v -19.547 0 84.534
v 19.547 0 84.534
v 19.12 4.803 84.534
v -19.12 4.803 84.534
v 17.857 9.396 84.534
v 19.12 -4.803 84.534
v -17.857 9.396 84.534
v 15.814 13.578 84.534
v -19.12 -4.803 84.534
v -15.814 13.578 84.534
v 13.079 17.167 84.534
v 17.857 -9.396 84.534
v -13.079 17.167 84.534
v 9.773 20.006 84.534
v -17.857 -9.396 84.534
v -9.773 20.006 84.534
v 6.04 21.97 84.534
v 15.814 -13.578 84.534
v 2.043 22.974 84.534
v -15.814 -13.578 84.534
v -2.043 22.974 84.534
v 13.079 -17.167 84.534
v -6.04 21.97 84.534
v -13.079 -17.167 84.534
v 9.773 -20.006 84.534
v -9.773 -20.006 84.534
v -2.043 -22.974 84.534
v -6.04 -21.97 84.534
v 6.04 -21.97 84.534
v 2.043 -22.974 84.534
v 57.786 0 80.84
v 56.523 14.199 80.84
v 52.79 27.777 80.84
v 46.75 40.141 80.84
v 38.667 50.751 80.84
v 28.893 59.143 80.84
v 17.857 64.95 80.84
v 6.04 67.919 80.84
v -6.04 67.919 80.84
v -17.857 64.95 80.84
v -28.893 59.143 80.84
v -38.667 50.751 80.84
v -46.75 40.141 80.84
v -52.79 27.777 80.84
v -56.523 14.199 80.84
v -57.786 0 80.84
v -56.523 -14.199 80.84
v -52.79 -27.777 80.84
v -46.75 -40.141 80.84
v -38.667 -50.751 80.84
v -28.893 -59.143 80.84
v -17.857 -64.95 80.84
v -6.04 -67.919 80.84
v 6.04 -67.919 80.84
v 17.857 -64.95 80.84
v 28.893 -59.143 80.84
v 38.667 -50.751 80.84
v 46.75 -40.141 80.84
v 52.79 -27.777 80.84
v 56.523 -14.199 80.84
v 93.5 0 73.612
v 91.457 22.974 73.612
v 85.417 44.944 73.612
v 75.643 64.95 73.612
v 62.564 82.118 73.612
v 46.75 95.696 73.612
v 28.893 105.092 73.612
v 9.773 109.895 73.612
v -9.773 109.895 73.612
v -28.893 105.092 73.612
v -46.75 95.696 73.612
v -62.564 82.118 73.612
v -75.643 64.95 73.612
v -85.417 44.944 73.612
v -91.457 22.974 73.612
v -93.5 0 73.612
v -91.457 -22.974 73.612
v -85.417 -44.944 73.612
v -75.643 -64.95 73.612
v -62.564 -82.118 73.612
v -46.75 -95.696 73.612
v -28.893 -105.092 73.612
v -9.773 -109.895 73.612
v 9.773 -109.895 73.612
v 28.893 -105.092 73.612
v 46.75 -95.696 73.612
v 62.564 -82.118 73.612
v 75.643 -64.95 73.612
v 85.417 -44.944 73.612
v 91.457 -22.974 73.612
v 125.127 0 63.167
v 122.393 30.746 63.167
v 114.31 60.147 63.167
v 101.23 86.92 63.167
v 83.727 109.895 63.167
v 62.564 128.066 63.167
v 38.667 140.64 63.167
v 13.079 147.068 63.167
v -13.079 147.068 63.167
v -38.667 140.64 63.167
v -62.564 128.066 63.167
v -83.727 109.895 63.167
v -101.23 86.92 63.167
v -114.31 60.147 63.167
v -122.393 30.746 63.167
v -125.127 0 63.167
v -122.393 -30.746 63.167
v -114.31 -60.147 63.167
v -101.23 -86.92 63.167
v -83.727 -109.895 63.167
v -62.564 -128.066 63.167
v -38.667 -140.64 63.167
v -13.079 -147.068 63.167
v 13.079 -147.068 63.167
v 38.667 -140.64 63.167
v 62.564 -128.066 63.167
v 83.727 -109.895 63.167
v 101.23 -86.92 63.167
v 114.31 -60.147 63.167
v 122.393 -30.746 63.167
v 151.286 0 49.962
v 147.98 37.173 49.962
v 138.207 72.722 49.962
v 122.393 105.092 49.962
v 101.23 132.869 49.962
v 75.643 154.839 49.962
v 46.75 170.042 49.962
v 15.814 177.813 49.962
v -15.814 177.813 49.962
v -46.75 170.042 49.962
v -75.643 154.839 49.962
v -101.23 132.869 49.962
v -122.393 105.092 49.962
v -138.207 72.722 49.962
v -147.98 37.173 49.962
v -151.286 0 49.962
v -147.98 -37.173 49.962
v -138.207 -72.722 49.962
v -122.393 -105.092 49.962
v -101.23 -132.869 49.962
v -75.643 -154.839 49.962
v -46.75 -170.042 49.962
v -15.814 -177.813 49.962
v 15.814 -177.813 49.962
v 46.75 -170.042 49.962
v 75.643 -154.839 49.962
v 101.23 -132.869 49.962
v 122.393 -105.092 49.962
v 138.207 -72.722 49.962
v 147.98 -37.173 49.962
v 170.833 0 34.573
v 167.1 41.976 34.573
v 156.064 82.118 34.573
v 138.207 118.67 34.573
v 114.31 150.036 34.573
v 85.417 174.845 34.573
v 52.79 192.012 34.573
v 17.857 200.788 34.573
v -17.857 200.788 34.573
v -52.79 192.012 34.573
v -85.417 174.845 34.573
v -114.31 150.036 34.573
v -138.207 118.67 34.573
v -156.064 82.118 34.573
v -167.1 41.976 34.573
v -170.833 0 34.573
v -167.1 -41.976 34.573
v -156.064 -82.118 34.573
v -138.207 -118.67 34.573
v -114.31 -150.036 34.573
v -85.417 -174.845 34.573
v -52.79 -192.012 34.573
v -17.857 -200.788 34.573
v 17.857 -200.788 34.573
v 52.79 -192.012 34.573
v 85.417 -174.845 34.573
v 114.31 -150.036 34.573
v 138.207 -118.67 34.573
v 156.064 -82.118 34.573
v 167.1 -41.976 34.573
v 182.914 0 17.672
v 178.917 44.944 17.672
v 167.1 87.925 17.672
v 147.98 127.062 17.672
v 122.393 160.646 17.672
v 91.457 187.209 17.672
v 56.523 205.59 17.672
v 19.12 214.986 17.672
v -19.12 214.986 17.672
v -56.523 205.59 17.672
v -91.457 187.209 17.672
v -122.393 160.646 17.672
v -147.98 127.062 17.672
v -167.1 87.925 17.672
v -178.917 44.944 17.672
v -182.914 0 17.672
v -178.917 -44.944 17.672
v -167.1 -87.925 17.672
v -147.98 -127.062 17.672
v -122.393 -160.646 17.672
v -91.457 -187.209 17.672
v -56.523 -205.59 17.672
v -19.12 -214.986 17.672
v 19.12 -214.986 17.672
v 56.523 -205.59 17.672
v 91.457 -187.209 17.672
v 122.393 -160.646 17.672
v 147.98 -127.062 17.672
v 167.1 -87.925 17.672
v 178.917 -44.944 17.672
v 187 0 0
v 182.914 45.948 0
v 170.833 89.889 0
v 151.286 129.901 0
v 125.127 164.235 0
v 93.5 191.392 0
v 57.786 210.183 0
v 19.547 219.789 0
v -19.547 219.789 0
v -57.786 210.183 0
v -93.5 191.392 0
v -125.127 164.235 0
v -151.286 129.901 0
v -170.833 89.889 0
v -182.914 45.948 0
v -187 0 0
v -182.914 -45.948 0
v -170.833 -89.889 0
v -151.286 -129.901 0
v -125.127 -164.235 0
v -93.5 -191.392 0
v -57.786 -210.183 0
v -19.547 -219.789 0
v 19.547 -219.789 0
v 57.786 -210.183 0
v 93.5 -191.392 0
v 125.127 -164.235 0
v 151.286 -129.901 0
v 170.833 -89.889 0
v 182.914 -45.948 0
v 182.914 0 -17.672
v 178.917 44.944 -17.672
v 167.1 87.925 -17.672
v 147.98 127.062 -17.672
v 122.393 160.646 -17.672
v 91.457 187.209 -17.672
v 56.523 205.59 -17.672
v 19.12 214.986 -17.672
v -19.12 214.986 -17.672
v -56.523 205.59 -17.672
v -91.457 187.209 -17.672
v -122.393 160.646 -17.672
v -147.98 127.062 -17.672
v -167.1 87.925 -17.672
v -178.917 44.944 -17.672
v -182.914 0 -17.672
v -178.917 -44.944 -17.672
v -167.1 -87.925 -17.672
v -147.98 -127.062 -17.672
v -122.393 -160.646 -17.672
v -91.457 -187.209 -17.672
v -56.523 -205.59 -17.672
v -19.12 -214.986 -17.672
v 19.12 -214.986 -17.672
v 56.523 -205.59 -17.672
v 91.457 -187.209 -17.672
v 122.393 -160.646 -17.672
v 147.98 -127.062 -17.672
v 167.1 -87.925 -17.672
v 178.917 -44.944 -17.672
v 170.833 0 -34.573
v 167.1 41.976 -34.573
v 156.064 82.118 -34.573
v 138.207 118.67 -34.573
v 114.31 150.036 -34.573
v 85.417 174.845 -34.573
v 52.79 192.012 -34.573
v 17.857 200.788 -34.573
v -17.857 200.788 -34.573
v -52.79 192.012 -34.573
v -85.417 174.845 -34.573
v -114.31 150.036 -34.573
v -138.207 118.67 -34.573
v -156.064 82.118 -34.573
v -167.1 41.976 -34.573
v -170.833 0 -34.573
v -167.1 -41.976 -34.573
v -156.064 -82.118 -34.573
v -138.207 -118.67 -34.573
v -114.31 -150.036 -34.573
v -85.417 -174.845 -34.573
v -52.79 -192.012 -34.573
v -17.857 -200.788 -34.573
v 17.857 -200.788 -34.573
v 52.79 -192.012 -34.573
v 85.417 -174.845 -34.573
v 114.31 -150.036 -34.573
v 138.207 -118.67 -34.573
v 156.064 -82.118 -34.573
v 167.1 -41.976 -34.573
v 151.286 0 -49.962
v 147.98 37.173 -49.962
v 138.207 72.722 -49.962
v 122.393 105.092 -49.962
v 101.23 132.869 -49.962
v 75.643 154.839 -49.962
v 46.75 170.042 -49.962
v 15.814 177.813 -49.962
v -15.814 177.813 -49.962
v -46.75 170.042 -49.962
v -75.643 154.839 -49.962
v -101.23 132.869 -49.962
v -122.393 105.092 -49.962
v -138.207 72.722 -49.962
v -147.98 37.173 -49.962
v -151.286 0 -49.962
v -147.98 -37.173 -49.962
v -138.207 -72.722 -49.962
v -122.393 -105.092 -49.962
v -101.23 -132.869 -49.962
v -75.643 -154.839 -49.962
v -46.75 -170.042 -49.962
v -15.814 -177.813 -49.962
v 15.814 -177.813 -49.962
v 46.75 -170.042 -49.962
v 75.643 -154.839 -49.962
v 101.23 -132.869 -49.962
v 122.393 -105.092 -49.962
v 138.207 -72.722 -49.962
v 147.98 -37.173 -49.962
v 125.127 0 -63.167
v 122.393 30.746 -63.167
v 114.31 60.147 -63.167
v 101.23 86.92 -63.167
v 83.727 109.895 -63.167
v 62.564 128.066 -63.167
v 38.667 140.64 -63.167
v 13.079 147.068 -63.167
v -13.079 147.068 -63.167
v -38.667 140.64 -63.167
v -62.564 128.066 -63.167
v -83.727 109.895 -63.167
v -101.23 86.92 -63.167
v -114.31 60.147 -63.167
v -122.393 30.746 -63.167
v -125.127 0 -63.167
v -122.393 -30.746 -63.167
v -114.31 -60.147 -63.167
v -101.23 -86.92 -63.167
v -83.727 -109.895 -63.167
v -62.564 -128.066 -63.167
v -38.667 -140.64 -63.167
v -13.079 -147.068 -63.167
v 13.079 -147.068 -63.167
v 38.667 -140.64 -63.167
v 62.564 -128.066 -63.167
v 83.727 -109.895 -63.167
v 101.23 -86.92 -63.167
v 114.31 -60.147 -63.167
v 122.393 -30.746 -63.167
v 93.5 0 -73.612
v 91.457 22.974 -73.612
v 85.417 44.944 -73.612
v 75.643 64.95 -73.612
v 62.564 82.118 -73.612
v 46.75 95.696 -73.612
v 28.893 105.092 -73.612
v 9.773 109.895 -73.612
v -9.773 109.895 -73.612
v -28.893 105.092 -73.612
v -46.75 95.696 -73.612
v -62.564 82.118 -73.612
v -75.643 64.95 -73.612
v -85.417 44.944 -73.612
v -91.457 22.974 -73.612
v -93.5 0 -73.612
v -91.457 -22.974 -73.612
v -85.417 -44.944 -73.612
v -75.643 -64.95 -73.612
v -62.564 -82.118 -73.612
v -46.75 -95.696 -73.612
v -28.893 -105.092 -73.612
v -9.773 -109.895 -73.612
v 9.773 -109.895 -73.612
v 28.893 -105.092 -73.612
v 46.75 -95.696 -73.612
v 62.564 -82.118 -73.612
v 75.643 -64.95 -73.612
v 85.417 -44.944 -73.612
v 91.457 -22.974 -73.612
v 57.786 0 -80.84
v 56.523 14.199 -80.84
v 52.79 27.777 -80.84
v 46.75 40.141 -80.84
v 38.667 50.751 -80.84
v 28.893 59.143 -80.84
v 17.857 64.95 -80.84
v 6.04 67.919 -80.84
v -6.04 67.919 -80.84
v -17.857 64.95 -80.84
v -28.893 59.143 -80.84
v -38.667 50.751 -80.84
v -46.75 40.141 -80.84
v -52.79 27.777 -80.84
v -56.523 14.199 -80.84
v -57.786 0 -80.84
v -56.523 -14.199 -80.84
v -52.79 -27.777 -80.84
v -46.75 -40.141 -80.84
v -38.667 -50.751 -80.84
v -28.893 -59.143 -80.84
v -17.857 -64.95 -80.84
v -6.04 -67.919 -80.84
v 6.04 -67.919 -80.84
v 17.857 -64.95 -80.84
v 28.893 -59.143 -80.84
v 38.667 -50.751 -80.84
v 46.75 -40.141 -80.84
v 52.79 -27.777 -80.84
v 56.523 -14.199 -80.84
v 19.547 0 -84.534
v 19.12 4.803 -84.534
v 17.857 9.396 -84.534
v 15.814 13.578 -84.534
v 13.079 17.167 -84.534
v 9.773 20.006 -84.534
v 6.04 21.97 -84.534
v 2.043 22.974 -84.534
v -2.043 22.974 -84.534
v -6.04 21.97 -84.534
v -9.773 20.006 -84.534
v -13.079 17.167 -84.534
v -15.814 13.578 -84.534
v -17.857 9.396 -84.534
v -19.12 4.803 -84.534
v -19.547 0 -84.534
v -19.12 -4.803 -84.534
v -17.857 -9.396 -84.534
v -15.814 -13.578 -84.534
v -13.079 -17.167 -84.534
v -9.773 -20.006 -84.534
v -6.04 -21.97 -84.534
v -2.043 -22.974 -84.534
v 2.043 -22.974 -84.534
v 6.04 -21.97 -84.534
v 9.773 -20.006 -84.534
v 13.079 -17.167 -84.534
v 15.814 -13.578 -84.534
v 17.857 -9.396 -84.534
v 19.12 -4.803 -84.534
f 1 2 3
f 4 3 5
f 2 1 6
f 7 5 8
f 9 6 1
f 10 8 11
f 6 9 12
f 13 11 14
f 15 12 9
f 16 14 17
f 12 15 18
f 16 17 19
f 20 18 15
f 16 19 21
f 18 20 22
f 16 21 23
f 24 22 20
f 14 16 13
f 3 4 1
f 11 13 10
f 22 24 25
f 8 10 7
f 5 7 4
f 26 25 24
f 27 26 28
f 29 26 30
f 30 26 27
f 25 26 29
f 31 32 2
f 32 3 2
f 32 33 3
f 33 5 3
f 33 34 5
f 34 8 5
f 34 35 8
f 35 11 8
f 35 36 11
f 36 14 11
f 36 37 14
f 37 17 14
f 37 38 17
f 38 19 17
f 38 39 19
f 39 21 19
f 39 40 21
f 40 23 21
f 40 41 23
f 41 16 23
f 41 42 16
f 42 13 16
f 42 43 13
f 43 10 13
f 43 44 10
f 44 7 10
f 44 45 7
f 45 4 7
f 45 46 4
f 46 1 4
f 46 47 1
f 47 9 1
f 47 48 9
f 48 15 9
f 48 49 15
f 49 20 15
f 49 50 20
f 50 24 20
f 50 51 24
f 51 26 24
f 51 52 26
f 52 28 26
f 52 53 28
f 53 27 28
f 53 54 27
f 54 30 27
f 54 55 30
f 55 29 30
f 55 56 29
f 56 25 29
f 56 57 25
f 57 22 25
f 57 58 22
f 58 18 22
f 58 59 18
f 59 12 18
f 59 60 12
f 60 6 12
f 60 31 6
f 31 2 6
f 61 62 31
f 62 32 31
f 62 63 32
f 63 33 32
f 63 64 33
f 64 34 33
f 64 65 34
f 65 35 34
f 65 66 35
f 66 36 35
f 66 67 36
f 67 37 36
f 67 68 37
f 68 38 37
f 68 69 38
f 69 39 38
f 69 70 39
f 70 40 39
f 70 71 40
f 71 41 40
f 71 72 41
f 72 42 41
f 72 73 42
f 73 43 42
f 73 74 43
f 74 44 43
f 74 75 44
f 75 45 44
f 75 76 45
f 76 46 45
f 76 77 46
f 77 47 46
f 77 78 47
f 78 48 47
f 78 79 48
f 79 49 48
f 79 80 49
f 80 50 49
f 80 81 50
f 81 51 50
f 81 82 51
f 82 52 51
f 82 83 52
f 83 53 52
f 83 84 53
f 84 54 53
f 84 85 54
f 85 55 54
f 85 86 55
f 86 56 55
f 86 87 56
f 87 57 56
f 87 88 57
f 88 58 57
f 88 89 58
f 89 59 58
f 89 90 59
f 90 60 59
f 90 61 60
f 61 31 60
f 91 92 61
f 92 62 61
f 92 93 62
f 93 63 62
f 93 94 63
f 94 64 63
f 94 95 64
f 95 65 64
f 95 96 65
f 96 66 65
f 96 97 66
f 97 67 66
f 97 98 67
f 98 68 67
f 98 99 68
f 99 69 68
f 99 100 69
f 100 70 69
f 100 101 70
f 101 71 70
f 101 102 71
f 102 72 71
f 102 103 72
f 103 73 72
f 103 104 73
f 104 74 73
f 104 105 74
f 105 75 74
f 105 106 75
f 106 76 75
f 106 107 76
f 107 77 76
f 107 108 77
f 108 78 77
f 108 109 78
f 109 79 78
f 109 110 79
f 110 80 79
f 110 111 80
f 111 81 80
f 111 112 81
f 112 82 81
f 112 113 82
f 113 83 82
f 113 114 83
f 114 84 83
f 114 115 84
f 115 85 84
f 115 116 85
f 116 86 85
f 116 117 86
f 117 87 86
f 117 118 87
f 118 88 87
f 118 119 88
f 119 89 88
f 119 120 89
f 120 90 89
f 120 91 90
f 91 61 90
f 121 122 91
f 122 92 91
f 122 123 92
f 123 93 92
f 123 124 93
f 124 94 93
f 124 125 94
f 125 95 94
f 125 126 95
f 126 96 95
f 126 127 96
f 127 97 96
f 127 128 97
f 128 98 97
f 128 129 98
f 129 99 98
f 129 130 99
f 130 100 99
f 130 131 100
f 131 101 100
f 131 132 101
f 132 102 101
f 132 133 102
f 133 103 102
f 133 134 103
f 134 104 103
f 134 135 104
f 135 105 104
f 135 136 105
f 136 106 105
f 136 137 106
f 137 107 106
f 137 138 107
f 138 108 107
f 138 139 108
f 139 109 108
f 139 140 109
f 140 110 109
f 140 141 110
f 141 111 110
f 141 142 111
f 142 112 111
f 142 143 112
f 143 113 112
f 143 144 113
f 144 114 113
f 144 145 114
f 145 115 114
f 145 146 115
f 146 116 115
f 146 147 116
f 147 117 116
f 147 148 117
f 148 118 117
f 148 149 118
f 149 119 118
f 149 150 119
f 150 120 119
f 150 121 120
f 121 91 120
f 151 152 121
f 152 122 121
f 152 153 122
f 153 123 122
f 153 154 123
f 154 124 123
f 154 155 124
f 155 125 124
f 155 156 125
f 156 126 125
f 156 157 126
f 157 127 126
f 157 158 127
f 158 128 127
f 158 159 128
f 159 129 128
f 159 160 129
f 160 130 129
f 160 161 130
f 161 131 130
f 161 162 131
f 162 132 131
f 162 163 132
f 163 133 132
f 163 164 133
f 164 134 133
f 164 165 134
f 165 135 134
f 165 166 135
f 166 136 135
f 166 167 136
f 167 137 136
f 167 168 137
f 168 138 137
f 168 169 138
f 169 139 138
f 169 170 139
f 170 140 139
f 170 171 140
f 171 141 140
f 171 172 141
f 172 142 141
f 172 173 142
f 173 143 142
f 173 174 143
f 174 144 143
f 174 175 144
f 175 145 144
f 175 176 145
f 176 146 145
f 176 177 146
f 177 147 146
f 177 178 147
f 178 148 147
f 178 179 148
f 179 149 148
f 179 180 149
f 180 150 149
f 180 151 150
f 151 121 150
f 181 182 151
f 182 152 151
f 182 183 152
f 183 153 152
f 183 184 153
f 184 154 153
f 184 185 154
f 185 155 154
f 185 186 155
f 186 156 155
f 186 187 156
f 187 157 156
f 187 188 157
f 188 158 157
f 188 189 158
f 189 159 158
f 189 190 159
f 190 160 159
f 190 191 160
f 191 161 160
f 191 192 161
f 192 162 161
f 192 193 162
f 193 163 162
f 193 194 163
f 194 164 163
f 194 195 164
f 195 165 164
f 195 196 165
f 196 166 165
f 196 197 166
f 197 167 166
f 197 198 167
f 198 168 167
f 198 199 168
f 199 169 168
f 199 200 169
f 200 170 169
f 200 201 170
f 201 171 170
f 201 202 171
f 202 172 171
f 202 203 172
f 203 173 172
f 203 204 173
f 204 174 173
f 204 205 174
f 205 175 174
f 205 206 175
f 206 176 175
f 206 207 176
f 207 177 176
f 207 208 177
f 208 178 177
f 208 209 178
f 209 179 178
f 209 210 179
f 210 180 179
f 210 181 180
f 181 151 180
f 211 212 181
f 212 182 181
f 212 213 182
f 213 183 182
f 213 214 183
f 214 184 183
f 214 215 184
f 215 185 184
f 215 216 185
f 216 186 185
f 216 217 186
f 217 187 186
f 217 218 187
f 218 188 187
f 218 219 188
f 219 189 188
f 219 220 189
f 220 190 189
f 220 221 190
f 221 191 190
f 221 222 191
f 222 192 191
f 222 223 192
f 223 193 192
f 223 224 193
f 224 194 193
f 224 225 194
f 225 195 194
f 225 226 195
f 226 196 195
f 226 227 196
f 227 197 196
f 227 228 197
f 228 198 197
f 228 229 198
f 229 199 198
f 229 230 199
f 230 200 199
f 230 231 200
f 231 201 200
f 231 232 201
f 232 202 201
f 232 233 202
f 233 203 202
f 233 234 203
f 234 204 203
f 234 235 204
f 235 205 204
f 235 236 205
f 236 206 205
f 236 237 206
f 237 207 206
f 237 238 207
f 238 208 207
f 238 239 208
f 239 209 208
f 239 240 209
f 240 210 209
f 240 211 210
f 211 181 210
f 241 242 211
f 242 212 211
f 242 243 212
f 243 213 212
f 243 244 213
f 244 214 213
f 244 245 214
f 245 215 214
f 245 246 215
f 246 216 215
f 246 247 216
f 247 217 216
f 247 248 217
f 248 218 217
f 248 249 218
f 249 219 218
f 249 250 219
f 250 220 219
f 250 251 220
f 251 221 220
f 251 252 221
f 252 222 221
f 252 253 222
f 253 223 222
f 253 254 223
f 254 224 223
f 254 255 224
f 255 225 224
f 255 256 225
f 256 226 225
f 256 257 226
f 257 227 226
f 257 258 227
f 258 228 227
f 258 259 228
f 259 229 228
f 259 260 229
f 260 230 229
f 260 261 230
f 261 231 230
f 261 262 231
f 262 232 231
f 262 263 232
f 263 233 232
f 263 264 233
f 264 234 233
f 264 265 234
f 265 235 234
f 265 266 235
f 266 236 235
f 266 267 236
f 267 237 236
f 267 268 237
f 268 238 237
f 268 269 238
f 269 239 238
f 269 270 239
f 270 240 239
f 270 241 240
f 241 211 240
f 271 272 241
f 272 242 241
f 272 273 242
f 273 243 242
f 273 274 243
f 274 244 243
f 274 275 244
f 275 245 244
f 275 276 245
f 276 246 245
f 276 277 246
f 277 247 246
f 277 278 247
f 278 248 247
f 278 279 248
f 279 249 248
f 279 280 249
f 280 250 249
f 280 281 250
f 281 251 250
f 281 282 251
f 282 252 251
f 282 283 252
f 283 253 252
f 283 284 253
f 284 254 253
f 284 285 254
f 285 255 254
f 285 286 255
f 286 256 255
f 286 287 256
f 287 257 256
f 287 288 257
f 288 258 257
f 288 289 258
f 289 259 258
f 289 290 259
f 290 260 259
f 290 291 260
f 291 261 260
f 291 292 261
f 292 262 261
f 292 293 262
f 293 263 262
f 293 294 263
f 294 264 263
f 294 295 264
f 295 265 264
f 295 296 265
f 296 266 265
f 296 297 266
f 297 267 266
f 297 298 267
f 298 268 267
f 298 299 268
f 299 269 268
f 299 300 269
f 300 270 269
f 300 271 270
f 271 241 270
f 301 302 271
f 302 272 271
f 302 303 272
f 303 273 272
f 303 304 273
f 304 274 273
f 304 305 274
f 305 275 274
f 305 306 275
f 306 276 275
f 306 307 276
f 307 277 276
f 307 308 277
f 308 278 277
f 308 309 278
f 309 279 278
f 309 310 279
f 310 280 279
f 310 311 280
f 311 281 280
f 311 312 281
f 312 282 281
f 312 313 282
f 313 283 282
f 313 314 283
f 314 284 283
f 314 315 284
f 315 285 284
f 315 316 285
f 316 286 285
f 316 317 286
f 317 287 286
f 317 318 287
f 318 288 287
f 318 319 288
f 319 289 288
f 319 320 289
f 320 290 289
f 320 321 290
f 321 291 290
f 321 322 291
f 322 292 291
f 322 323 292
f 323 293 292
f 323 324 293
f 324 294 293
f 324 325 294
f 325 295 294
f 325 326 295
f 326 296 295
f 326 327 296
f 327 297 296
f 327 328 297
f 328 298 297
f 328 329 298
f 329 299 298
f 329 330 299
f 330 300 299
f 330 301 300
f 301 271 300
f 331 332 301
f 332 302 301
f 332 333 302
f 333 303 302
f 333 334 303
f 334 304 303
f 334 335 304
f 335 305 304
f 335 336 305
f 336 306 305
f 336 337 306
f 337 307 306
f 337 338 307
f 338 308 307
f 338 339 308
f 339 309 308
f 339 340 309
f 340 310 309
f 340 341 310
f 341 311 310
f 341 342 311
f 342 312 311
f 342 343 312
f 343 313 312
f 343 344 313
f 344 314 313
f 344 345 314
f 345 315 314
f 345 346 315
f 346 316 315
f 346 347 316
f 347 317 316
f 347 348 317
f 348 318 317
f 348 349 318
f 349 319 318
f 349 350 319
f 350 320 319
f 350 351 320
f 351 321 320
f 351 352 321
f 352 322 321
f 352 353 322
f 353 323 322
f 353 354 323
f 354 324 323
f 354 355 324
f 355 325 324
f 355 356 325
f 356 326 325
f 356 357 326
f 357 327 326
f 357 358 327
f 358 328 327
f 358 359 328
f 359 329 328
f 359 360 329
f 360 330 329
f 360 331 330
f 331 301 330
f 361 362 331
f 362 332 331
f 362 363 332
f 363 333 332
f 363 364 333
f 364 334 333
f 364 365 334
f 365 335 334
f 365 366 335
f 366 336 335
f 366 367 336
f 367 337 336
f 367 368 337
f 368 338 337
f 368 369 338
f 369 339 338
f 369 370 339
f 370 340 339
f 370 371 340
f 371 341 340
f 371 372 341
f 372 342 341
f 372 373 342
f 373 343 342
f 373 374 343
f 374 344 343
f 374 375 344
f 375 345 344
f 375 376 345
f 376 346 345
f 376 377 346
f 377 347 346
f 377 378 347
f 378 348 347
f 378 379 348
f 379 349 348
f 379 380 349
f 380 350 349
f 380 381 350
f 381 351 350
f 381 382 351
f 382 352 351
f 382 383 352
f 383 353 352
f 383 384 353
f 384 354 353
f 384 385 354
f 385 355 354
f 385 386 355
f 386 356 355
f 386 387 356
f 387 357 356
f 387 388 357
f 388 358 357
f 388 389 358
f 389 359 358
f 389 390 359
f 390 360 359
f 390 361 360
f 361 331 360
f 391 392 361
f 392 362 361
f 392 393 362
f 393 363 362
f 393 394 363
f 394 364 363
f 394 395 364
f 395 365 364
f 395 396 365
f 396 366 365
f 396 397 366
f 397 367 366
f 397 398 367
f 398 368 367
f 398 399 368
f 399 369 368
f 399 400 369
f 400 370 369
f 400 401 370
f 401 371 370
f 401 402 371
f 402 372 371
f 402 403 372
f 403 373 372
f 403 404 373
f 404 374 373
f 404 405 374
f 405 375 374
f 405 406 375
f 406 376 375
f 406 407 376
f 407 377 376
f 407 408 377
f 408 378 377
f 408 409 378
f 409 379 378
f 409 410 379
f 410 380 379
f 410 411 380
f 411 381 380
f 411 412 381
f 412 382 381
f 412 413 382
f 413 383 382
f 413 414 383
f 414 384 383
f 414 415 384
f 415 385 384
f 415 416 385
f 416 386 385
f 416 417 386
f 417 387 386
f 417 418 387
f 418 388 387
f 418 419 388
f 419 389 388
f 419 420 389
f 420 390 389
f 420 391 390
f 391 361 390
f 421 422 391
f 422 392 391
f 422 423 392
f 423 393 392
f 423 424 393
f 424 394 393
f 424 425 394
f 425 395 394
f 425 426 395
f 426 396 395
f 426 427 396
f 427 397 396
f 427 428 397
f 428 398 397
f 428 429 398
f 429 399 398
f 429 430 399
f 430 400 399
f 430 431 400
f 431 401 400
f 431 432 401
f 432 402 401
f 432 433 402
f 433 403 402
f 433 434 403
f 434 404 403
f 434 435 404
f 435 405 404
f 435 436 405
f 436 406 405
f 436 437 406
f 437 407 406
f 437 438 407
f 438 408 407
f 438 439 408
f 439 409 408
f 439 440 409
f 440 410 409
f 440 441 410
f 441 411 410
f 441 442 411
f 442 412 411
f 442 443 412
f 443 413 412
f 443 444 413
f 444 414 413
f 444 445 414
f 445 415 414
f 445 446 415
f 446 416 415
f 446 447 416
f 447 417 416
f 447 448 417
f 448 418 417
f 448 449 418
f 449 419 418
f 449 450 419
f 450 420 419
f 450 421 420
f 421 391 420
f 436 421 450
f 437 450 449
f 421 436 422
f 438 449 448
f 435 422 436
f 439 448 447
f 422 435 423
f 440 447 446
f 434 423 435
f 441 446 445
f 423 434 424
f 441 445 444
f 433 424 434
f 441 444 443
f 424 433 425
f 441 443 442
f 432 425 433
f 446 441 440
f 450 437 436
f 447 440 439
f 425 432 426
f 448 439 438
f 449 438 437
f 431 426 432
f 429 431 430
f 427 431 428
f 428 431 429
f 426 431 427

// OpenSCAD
// Generated by SolidPython 1.0.1 on 2020-07-29 00:46:49


scale(v = [11, 13, 5]) {
	sphere(r = 17);
}
/***********************************************
*********      SolidPython code:      **********
************************************************
 
# import packages: SolidPython
from solid import *
from solid.utils import *
from itertools import chain, combinations, permutations


class Resize:

    def __init__(self, scad_file):
        self.scad_file = scad_file
        #self.scad_file = import_scad(scad_file)
        # cone/cylinder param:
        self.r1 = 0
        self.r2 = 0
        self.h = 0
        # rectangular prism param:
        self.w = 0
        self.l = 0
        # ellipse param:
        self.r = 0

    # import OpenScad code (file name corresponds to shape)


    # classify shape + parameters
    def assign(self, param1, param2, param3):
        if self.scad_file == 'cone.scad':
            self.r1 = param1
            self.r2 = param2
            self.h = param3
        elif self.scad_file == 'cylinder.scad':
            self.r1 = param1
            self.r2 = param2
            self.h = param3
        elif self.scad_file == 'rectangularPrism.scad':
            self.h = param1
            self.l = param2
            self.w = param3
        else:
            self.r = param1
            self.h = param2

    # resize parameters
    def iterate(self):
        x = range(3, 20, 2)
        i = 1
        if self.scad_file == 'cone.scad':
            tempList = list(permutations(x, 2))
            for temp in tempList:
                param1 = temp[0]
                param2 = temp[1]
                filepath = 'produced_scad_files/' + 'cone' + str(param1) + '_' + str(param2) + '_' + '.scad'
                scad_render_to_file(cylinder(h=param1, r1=param2, r2=0), filepath)

        elif self.scad_file == 'cylinder.scad':
            tempList = list(permutations(x, 3))
            for temp in tempList:
                param1 = temp[0]
                param2 = temp[1]
                filepath = 'produced_scad_files/' + 'cylinder' + str(param1) + '_' + str(param2) + '_' + '.scad'
                scad_render_to_file(cylinder(h=param1, r1=param2, r2=param2), filepath)

        elif self.scad_file == 'rectangularPrism.scad':
            tempList = list(permutations(x, 3))
            for temp in tempList:
                param1 = temp[0]
                param2 = temp[1]
                param3 = temp[2]
                filepath = 'produced_scad_files/' + 'rectangularPrism' + str(param1) + '_' + str(param2) + '_' + str(
                    param3) + '.scad'
                scad_render_to_file(cube(size=(param1, param2, param3)), filepath)

        elif self.scad_file == 'ellipse.scad':
            tempList = list(permutations(x, 4))
            for temp in tempList:
                param1 = temp[0]
                param2 = temp[1]
                param3 = temp[2]
                param4 = temp[3]
                filepath = 'produced_scad_files/' + 'ellipse' + str(param1) + '_' + str(param2) + '_' + str(param3) + '_' + str(param4) + '.scad'
                scad_render_to_file(scale([param1, param2, param3])(sphere(r=param4)), filepath)

    def render_to_scadfile(self):
        scad_render_to_file(scad, 'example.scad') 
 
************************************************/
